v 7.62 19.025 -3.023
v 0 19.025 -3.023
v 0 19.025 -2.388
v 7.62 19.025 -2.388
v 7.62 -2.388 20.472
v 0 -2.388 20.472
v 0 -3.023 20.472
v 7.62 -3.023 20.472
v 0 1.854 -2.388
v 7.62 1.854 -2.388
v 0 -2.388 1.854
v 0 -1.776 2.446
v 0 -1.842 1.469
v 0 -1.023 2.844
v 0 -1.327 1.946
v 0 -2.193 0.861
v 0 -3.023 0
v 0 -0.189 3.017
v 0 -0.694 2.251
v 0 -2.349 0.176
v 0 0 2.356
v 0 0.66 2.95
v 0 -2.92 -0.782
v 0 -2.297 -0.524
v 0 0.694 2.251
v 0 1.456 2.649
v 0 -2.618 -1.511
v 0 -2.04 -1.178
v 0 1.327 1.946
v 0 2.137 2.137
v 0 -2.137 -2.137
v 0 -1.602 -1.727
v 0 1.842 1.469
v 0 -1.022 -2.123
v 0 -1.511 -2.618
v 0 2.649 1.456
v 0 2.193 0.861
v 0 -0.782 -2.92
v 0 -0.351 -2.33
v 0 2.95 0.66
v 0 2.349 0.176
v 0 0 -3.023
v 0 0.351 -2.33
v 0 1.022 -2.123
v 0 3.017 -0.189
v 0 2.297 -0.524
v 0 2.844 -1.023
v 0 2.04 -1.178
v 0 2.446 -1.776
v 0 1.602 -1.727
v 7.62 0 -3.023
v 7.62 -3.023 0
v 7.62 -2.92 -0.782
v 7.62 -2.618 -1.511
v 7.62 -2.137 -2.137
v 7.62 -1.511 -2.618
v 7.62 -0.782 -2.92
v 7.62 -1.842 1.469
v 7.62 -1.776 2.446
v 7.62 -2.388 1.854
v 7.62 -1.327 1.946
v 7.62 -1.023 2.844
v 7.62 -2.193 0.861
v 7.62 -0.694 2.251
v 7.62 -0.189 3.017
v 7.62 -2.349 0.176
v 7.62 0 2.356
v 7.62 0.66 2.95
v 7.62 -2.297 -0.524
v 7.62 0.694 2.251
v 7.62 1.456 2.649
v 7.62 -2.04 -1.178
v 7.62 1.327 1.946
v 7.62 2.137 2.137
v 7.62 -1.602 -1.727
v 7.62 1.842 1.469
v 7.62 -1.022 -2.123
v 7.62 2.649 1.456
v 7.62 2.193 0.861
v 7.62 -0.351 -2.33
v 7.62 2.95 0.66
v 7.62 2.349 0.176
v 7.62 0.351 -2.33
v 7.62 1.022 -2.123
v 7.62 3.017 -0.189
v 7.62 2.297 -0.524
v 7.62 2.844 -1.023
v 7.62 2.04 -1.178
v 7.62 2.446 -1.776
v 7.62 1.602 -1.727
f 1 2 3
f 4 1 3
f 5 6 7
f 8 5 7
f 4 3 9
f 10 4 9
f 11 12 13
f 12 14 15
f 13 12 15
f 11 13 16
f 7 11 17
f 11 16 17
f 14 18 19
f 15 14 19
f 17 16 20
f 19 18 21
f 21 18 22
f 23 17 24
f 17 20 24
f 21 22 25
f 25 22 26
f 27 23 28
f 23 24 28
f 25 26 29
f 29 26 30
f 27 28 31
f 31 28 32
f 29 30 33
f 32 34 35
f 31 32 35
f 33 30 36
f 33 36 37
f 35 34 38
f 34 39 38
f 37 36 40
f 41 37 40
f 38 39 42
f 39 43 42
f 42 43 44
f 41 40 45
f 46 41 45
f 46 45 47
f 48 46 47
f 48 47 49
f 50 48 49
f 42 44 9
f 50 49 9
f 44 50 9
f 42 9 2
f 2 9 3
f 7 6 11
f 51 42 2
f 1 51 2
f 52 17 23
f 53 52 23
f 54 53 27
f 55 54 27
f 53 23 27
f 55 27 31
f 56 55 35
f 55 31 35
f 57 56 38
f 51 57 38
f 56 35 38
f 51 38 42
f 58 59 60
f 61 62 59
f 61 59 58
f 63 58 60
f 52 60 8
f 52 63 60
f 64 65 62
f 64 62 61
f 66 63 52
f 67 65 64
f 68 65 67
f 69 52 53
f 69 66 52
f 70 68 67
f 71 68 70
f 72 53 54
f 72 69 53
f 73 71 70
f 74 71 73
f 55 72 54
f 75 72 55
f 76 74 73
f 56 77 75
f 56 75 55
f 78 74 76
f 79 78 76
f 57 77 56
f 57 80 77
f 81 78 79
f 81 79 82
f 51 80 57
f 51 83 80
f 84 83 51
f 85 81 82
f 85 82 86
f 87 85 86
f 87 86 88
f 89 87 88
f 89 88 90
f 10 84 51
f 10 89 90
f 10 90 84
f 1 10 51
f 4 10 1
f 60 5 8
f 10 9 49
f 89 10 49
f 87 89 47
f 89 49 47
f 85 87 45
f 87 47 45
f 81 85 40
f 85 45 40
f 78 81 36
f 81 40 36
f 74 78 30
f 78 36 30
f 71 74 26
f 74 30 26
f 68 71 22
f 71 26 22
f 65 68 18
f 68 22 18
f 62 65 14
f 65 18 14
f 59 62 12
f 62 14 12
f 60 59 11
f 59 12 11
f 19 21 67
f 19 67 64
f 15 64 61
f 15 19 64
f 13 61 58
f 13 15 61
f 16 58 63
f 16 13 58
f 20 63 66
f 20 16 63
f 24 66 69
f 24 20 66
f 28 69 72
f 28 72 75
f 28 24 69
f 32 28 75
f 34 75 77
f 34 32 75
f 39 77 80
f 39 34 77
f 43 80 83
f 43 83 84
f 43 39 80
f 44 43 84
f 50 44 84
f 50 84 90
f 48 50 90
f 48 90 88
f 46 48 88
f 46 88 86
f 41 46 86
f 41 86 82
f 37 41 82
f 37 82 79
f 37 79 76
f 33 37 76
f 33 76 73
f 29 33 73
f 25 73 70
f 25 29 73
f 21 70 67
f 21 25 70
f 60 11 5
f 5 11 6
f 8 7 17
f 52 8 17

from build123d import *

# Parameters (mm, degrees)
SKETCH1_R           = 2.35585
BOSS_EXTRUDE1_DEPTH = 7.62


with BuildPart() as part:
    # Sketch1 → Boss-Extrude1 (new body)
    with BuildSketch(Plane(origin=(0, 0, 0), x_dir=(0, 0, -1), z_dir=(1, 0, 0))):
        with BuildLine():
            Line((3.0226, 0), (3.0226, 19.0246))
            Line((3.0226, 19.0246), (2.3876, 19.0246))
            Line((2.3876, 19.0246), (2.3876, 1.853503979))
            ThreePointArc((2.3876, 1.853503979), (-2.137300957, 2.137300957), (-1.853503979, -2.3876))
            Line((-1.853503979, -2.3876), (-20.4724, -2.3876))
            Line((-20.4724, -2.3876), (-20.4724, -3.0226))
            Line((-20.4724, -3.0226), (0, -3.0226))
            ThreePointArc((0, -3.0226), (2.137300957, -2.137300957), (3.0226, 0))
        make_face()
        with Locations(Location((0, 0, 0), (0, 0, 180))):
            Circle(SKETCH1_R, mode=Mode.SUBTRACT)
    extrude(amount=BOSS_EXTRUDE1_DEPTH)


solid = part.part
